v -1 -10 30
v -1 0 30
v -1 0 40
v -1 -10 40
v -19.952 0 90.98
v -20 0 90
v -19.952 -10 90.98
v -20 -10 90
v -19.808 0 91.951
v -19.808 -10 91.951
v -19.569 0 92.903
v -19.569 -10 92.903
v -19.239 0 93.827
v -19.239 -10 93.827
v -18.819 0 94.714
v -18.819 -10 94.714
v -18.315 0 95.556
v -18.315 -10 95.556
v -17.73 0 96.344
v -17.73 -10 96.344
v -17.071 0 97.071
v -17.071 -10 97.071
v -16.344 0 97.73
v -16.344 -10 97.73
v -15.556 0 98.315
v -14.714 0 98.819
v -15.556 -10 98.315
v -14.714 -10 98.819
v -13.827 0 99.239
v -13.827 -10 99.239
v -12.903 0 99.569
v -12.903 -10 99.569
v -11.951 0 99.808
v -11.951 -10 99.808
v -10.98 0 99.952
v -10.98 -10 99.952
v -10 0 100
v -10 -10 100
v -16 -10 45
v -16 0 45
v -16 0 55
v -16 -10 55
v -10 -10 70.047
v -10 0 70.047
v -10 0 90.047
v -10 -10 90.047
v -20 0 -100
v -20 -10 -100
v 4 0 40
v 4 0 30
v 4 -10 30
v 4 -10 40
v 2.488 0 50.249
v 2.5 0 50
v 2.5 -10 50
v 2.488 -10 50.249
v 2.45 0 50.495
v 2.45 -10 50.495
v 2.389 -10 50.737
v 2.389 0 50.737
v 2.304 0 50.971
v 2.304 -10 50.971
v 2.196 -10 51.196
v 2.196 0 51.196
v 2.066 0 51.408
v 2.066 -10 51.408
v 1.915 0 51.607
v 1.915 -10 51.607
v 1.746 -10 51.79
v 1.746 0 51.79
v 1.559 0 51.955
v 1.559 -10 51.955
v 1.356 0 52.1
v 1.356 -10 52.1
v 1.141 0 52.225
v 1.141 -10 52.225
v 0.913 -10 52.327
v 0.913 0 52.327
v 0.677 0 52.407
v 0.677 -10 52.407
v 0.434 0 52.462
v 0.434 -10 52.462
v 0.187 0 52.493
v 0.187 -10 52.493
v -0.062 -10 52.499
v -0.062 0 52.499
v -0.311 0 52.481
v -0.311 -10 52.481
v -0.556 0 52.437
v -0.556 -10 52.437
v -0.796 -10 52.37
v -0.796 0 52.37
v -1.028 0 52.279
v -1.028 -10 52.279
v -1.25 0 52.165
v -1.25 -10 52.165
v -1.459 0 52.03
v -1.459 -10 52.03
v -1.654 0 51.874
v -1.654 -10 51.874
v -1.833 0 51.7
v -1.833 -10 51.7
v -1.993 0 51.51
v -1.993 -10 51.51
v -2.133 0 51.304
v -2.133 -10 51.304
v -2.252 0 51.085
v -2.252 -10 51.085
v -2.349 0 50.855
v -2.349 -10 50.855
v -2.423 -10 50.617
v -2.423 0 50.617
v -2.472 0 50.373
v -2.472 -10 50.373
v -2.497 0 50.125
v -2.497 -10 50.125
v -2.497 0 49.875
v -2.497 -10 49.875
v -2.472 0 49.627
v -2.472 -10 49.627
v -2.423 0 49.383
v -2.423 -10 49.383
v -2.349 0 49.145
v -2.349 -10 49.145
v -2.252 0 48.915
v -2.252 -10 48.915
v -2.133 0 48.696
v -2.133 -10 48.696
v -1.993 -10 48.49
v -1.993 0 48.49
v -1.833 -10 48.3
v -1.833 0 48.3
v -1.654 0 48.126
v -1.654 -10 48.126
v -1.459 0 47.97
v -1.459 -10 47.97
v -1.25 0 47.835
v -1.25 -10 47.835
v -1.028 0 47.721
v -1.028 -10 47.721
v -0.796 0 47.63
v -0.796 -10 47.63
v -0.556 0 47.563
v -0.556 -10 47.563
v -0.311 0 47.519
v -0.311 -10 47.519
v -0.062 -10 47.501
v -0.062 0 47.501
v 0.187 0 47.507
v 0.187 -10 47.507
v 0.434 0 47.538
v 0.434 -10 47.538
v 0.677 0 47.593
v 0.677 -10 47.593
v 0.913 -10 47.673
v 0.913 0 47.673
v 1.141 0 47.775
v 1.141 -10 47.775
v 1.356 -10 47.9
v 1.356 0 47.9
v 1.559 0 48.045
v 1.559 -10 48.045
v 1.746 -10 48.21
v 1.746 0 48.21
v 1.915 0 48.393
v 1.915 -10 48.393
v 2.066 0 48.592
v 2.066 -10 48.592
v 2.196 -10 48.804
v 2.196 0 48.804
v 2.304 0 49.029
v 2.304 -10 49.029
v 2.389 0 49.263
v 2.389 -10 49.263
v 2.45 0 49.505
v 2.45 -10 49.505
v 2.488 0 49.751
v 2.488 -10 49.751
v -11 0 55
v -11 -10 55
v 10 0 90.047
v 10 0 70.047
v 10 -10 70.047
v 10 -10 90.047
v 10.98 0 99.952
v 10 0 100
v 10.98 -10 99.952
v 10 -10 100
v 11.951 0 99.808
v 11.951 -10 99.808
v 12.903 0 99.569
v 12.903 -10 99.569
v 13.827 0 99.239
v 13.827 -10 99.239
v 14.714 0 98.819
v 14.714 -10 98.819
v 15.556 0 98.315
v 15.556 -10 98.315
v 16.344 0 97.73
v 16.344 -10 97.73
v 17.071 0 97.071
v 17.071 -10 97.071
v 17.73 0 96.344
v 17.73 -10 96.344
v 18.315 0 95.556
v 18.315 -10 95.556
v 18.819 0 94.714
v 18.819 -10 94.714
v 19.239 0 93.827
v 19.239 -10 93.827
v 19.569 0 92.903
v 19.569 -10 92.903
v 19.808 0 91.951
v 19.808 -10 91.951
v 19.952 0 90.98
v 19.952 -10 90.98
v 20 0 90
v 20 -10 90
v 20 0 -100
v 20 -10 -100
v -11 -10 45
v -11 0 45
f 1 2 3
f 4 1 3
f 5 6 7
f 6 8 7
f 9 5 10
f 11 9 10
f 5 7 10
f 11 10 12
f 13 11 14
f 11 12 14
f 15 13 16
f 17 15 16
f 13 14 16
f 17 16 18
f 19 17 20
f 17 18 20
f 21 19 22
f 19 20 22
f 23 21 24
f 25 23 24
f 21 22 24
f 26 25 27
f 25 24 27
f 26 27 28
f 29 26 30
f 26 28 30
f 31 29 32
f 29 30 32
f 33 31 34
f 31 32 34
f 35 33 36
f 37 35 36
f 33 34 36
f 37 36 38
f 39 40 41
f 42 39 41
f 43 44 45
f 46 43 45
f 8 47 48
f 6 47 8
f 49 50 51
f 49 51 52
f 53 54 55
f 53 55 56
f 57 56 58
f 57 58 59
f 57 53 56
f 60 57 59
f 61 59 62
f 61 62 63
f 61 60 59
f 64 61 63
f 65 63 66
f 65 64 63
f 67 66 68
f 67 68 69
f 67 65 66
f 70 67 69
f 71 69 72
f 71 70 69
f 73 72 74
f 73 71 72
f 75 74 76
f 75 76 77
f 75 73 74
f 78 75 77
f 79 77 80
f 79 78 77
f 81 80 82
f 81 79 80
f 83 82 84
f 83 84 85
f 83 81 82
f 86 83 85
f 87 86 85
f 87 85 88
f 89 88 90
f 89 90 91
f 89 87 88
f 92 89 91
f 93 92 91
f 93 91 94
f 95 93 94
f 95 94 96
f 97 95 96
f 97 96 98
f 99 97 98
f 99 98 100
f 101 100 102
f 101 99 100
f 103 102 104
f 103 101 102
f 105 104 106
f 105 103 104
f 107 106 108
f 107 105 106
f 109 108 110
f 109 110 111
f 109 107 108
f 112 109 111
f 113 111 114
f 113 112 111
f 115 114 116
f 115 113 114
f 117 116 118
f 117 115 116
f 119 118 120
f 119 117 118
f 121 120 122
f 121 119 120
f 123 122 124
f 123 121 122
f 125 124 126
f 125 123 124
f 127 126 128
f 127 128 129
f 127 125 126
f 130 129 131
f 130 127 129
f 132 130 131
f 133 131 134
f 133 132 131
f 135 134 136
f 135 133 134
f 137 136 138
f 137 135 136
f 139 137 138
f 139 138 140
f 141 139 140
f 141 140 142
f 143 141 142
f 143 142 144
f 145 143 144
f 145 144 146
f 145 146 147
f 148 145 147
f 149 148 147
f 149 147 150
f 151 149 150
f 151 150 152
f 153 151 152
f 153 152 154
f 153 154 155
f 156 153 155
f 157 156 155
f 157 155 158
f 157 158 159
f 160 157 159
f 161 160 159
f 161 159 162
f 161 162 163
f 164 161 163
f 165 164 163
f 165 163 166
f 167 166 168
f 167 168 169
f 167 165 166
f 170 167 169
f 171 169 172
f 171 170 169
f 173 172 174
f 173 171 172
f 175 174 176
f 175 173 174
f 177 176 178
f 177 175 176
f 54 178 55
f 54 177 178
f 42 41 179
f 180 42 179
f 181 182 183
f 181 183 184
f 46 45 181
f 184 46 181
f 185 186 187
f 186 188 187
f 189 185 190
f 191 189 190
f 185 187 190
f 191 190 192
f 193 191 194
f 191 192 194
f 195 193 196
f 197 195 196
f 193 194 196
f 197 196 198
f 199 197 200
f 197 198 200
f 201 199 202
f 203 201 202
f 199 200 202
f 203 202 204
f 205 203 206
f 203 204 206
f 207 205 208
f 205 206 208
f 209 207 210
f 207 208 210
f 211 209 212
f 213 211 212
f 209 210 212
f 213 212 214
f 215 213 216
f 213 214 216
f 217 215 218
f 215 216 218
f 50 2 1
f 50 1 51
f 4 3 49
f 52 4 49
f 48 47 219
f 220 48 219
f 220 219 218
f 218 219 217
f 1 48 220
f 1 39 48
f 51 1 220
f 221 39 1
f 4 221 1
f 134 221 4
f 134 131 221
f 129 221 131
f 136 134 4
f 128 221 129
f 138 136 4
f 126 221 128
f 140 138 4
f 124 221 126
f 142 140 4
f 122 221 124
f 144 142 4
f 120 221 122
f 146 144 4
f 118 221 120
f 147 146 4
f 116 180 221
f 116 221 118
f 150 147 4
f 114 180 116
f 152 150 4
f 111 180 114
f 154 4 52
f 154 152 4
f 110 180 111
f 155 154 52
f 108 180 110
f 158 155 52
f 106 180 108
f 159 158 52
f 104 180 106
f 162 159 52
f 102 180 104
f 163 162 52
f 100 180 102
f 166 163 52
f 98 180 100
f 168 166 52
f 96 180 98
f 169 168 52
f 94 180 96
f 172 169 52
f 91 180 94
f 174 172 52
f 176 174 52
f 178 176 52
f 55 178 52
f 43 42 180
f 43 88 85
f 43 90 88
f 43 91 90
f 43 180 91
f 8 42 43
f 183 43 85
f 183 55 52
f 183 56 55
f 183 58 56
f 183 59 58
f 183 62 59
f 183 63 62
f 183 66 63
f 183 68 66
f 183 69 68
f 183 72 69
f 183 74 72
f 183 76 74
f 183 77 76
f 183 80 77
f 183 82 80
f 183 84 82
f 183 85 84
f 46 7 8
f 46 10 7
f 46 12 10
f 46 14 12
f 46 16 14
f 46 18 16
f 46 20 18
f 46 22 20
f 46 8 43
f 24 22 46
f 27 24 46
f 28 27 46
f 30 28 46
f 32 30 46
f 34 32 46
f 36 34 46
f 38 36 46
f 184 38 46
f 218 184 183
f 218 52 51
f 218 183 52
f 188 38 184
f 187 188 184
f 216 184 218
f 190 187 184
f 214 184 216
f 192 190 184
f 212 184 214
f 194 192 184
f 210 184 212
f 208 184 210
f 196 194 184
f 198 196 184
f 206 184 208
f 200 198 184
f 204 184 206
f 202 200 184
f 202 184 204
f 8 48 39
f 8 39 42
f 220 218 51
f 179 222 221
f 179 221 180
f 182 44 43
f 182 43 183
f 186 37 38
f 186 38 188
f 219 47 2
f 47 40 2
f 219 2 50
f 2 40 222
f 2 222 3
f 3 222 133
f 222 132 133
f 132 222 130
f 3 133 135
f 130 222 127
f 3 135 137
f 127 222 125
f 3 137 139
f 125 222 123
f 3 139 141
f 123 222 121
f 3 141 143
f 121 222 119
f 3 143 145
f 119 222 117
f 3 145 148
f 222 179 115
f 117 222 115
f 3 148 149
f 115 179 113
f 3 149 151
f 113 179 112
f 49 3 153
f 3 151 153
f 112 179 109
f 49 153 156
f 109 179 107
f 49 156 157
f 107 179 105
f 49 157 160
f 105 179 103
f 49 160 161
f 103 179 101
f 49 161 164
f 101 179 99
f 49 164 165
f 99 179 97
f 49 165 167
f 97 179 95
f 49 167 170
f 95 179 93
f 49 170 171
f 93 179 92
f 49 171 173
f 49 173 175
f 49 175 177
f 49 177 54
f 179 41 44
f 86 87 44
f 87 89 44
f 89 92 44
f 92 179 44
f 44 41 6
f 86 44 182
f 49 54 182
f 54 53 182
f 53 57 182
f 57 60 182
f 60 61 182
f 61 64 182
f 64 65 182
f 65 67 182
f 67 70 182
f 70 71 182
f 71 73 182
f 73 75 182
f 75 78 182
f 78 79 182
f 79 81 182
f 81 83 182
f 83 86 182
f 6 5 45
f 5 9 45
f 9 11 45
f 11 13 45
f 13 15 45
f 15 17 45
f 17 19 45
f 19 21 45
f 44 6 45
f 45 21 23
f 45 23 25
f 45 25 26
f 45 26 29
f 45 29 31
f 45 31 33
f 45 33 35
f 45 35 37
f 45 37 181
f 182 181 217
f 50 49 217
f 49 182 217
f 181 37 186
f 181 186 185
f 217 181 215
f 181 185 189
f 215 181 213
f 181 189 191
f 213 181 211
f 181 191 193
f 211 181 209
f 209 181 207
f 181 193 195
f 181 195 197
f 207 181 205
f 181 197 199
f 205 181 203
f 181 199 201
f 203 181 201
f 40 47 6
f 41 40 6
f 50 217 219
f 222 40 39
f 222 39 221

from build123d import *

# Parameters (mm, degrees)
F0_W     = 40
F0_H     = 200
F0_W_2   = 5
F0_H_2   = 10
F0_R     = 2.5
F0_W_3   = 20
F0_H_3   = 20
F1_DEPTH = 10
F2_R     = 10


with BuildPart() as f1:
    # F0 (on Front) → F1 (new body)
    with BuildSketch(Plane.XZ):
        Rectangle(F0_W, F0_H)
        with Locations((-13.5, 50)):
            Rectangle(F0_W_2, F0_H_2, mode=Mode.SUBTRACT)
        with Locations((1.5, 35)):
            Rectangle(F0_W_2, F0_H_2, mode=Mode.SUBTRACT)
        with Locations((0, 50)):
            Circle(F0_R, mode=Mode.SUBTRACT)
        with Locations((0, 80.0469)):
            Rectangle(F0_W_3, F0_H_3, mode=Mode.SUBTRACT)
    extrude(amount=F1_DEPTH)

    # F2
    f2_edges = [f1.edges().sort_by_distance(p)[0] for p in [
        (20, -5, 100),
        (-20, -5, 100),
    ]]
    fillet(f2_edges, radius=F2_R)


solid = f1.part
